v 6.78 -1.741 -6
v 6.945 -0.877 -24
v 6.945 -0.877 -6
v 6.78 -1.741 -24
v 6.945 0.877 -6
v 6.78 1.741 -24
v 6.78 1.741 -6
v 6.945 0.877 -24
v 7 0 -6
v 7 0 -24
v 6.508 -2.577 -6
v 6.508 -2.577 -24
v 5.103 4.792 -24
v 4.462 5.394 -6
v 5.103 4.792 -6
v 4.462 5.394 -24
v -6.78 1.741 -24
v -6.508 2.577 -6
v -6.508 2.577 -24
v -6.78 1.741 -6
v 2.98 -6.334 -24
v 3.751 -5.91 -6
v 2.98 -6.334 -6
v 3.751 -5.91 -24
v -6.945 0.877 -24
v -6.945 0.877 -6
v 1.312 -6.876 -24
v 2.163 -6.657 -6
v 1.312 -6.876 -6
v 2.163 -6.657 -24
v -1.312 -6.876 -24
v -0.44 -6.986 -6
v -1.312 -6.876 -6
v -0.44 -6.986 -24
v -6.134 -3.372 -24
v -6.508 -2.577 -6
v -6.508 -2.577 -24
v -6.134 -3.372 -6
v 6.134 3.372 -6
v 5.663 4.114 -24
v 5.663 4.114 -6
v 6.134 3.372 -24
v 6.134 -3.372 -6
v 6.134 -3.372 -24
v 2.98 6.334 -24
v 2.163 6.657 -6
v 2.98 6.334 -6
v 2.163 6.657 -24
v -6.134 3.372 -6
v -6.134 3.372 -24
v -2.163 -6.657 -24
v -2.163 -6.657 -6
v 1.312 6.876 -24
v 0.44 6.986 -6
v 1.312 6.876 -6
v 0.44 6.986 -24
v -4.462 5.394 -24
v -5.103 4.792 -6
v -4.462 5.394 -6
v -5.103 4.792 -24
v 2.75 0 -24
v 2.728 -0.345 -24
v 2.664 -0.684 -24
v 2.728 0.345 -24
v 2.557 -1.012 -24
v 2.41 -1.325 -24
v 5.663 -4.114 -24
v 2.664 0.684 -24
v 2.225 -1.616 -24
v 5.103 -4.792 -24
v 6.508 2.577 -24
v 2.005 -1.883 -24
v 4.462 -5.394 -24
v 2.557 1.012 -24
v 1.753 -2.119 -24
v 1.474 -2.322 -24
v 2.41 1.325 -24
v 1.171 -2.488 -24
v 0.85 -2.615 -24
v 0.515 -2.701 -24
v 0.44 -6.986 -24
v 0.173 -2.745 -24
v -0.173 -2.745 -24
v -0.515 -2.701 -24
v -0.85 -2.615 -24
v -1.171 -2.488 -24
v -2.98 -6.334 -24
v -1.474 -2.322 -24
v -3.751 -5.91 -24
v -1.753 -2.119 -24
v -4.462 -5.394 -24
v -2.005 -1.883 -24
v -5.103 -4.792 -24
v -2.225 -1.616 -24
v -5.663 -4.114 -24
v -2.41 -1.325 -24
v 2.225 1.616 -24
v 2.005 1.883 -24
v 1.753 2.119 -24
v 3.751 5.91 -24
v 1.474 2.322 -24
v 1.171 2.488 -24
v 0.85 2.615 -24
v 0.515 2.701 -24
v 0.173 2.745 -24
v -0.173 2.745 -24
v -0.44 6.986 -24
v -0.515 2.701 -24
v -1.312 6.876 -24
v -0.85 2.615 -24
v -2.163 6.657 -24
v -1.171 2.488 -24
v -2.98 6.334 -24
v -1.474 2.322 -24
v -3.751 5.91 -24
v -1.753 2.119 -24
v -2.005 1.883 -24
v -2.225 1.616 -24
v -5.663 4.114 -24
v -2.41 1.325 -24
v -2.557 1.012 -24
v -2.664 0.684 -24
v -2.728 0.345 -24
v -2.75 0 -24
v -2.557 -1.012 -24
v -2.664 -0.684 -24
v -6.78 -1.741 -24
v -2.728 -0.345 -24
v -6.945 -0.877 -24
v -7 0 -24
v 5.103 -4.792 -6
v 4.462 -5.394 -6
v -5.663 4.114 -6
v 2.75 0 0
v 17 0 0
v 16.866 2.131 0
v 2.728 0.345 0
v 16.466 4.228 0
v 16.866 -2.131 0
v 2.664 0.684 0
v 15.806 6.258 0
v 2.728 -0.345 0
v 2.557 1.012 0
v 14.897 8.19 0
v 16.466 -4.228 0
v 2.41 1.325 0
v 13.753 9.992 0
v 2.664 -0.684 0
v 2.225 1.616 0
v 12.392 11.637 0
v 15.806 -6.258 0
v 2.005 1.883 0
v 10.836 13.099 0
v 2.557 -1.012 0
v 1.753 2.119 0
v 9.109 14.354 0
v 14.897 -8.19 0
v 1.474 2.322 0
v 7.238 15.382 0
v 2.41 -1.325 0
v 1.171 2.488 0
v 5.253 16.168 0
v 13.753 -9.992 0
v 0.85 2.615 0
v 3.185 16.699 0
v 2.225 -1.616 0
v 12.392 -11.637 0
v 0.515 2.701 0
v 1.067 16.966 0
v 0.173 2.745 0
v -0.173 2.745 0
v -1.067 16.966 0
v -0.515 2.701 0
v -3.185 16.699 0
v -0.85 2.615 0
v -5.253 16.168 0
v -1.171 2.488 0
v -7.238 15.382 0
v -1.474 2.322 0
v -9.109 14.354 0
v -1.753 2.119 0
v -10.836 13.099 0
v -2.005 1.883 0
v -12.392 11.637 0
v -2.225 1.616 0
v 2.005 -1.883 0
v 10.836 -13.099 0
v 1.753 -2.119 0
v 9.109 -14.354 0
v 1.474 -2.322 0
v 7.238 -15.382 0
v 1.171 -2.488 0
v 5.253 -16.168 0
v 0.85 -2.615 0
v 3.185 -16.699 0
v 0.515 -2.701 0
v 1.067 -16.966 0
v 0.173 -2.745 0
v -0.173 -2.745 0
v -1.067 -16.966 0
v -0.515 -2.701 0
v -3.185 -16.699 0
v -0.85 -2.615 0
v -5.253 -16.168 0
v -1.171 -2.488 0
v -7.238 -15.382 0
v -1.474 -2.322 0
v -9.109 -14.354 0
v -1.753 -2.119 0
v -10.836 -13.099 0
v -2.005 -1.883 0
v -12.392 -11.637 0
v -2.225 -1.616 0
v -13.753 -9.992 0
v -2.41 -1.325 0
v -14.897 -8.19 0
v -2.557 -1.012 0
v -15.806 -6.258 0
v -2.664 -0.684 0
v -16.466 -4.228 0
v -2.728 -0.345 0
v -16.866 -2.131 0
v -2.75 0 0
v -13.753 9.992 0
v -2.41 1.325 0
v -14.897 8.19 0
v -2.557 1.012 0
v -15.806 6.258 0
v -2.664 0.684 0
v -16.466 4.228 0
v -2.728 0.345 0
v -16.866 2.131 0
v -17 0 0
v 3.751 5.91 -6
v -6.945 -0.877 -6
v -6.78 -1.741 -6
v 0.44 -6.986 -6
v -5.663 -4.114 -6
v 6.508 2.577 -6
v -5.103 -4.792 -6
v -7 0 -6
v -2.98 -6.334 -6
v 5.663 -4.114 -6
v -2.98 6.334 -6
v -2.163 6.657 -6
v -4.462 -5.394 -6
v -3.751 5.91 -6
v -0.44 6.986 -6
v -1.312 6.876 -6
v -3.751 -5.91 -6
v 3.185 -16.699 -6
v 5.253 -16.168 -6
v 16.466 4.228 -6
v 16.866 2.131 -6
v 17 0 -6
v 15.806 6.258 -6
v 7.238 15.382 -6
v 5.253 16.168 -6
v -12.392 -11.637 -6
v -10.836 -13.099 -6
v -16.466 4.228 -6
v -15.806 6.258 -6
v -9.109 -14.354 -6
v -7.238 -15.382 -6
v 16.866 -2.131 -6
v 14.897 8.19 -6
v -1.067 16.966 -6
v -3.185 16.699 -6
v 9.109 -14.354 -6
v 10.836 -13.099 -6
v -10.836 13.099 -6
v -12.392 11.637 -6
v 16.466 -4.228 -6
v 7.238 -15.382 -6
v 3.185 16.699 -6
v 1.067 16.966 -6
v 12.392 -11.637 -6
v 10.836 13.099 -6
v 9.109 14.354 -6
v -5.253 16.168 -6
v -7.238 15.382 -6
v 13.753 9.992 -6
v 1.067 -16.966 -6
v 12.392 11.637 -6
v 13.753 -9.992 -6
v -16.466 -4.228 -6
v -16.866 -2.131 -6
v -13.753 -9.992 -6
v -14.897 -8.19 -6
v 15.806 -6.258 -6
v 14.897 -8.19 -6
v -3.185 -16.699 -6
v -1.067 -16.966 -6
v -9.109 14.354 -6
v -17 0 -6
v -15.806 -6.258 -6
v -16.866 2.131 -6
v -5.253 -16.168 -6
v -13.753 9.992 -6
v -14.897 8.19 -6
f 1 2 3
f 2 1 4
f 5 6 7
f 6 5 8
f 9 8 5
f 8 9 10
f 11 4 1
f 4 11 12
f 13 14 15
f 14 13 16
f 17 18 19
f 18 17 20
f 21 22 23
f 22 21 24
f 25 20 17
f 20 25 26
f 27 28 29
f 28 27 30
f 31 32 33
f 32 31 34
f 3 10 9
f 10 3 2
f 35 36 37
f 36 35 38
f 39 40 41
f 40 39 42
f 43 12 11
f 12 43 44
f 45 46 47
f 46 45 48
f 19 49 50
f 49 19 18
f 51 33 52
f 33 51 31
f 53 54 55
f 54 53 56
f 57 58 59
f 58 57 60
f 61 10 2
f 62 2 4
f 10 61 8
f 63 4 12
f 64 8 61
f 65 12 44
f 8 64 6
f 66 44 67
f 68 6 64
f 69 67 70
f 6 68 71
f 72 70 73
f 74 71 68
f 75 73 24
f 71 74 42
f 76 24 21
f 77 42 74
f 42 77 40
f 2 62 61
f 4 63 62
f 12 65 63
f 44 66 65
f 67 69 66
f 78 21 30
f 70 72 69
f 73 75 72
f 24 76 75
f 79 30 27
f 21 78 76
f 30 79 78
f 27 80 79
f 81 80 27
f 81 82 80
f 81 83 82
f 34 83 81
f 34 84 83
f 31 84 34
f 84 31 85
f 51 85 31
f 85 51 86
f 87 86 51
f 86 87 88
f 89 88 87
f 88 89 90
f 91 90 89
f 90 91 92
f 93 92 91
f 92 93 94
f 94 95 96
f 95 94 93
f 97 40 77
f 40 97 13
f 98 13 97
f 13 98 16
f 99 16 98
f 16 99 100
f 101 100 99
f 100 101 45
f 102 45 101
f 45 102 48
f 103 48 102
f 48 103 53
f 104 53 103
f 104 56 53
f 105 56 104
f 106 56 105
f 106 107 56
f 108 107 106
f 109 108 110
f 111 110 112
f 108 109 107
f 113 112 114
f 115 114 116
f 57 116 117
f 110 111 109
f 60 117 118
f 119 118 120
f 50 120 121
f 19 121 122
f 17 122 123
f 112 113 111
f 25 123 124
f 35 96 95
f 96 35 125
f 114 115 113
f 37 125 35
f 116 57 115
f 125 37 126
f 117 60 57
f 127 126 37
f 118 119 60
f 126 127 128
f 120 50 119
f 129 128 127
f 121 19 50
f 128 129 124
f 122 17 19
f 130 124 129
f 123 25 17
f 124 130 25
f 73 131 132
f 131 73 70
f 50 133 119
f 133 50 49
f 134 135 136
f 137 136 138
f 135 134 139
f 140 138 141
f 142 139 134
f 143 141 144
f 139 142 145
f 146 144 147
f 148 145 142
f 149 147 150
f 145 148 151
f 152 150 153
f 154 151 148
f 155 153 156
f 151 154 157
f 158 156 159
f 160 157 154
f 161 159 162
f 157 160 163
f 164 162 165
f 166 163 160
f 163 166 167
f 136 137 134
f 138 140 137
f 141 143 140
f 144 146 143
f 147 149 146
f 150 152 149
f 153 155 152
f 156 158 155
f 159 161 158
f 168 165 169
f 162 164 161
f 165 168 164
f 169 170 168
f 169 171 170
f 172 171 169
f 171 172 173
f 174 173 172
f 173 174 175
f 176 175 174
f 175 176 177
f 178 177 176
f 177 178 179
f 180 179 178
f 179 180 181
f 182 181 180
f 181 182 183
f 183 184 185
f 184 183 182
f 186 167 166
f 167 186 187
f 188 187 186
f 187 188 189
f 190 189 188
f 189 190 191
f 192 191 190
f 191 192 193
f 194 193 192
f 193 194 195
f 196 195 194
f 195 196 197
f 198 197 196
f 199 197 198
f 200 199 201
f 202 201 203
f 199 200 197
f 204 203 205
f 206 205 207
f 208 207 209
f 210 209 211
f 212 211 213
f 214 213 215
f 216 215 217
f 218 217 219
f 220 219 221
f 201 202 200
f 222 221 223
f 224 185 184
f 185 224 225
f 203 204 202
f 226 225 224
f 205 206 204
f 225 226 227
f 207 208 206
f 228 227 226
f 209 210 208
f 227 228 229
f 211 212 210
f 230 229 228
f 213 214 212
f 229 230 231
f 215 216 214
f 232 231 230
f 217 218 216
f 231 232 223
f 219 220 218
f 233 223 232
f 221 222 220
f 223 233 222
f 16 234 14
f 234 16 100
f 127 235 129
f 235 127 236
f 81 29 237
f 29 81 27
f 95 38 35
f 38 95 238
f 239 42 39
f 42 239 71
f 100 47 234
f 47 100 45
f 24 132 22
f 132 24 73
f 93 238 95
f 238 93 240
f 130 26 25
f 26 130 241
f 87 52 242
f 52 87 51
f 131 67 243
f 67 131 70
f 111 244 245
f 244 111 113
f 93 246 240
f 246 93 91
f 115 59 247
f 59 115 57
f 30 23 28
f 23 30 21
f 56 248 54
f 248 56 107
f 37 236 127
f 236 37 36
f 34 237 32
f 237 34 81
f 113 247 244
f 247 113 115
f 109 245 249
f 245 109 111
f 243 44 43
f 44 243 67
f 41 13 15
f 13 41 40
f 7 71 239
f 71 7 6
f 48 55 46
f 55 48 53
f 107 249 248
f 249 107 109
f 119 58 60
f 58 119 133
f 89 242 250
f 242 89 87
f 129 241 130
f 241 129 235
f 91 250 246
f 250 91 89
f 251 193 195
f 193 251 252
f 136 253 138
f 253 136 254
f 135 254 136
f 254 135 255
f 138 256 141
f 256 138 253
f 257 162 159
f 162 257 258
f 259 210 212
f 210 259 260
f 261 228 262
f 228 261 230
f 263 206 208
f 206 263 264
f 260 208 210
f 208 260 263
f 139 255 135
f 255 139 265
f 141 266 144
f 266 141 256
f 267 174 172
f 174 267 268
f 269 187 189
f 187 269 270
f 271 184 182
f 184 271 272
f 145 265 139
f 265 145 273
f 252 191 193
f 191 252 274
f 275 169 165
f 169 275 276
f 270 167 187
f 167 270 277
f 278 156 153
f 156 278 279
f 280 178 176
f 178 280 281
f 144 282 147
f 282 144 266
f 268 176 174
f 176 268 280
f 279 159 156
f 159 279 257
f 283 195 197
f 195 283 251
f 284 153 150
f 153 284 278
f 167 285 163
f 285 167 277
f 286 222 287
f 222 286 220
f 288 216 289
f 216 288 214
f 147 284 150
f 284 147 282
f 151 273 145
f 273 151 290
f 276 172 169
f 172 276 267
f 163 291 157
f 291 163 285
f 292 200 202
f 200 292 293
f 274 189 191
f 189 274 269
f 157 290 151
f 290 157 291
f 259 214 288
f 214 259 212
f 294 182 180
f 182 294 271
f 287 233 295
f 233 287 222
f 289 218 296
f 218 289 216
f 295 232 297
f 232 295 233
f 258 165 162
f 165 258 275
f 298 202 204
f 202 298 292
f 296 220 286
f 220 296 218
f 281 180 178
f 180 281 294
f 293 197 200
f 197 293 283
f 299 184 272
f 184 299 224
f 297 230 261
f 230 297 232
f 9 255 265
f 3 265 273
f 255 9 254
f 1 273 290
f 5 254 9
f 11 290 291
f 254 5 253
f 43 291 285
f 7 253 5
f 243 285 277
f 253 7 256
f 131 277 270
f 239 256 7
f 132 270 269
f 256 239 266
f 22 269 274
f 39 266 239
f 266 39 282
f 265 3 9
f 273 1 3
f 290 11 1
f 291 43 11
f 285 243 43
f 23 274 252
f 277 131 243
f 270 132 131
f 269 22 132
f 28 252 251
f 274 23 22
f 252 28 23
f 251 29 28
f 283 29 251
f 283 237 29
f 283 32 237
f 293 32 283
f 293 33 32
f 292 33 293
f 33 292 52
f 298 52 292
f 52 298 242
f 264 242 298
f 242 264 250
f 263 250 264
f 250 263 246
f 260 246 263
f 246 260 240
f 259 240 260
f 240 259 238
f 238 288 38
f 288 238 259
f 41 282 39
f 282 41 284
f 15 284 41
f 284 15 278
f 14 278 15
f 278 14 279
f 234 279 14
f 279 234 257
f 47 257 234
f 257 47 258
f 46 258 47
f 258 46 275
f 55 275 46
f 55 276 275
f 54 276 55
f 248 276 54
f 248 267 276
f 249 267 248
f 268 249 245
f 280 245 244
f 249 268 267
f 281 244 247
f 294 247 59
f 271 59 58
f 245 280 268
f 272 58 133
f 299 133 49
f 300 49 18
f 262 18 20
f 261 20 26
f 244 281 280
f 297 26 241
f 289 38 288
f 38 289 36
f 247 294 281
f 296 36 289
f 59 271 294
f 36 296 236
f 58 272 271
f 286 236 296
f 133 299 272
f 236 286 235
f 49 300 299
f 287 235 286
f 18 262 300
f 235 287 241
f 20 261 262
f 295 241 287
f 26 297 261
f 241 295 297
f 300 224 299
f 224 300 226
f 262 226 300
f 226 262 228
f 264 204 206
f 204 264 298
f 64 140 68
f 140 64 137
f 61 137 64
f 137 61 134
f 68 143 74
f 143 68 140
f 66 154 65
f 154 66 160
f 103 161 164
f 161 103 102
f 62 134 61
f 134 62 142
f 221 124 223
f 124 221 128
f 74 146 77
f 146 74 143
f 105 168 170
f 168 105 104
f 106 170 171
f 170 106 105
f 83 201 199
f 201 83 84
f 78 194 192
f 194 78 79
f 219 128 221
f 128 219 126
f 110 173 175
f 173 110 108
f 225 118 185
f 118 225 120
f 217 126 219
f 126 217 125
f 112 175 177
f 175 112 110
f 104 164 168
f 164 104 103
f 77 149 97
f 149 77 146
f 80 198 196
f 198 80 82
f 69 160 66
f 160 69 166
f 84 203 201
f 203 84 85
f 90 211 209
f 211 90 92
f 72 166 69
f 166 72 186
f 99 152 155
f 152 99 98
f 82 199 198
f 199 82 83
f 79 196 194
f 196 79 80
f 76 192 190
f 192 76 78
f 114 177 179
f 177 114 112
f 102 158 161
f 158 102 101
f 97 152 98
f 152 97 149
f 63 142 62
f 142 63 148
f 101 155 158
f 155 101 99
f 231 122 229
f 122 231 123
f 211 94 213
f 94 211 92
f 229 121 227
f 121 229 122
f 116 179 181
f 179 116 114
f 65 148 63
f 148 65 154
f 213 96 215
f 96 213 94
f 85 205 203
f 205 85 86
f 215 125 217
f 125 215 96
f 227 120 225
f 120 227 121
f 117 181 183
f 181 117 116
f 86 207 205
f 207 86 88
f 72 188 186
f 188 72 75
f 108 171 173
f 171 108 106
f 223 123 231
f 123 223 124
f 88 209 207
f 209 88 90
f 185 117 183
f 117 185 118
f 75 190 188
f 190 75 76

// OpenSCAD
$fn = 50;


difference() {
	union() {
		translate(v = [0, 0, -24.0000000000]) {
			cylinder(h = 24, r = 7.0000000000);
		}
		translate(v = [0, 0, -6.0000000000]) {
			cylinder(h = 6, r = 17.0000000000);
		}
	}
	union() {
		#translate(v = [0, 0, -24]) {
			cylinder(h = 24, r = 2.7500000000);
		}
	}
}
